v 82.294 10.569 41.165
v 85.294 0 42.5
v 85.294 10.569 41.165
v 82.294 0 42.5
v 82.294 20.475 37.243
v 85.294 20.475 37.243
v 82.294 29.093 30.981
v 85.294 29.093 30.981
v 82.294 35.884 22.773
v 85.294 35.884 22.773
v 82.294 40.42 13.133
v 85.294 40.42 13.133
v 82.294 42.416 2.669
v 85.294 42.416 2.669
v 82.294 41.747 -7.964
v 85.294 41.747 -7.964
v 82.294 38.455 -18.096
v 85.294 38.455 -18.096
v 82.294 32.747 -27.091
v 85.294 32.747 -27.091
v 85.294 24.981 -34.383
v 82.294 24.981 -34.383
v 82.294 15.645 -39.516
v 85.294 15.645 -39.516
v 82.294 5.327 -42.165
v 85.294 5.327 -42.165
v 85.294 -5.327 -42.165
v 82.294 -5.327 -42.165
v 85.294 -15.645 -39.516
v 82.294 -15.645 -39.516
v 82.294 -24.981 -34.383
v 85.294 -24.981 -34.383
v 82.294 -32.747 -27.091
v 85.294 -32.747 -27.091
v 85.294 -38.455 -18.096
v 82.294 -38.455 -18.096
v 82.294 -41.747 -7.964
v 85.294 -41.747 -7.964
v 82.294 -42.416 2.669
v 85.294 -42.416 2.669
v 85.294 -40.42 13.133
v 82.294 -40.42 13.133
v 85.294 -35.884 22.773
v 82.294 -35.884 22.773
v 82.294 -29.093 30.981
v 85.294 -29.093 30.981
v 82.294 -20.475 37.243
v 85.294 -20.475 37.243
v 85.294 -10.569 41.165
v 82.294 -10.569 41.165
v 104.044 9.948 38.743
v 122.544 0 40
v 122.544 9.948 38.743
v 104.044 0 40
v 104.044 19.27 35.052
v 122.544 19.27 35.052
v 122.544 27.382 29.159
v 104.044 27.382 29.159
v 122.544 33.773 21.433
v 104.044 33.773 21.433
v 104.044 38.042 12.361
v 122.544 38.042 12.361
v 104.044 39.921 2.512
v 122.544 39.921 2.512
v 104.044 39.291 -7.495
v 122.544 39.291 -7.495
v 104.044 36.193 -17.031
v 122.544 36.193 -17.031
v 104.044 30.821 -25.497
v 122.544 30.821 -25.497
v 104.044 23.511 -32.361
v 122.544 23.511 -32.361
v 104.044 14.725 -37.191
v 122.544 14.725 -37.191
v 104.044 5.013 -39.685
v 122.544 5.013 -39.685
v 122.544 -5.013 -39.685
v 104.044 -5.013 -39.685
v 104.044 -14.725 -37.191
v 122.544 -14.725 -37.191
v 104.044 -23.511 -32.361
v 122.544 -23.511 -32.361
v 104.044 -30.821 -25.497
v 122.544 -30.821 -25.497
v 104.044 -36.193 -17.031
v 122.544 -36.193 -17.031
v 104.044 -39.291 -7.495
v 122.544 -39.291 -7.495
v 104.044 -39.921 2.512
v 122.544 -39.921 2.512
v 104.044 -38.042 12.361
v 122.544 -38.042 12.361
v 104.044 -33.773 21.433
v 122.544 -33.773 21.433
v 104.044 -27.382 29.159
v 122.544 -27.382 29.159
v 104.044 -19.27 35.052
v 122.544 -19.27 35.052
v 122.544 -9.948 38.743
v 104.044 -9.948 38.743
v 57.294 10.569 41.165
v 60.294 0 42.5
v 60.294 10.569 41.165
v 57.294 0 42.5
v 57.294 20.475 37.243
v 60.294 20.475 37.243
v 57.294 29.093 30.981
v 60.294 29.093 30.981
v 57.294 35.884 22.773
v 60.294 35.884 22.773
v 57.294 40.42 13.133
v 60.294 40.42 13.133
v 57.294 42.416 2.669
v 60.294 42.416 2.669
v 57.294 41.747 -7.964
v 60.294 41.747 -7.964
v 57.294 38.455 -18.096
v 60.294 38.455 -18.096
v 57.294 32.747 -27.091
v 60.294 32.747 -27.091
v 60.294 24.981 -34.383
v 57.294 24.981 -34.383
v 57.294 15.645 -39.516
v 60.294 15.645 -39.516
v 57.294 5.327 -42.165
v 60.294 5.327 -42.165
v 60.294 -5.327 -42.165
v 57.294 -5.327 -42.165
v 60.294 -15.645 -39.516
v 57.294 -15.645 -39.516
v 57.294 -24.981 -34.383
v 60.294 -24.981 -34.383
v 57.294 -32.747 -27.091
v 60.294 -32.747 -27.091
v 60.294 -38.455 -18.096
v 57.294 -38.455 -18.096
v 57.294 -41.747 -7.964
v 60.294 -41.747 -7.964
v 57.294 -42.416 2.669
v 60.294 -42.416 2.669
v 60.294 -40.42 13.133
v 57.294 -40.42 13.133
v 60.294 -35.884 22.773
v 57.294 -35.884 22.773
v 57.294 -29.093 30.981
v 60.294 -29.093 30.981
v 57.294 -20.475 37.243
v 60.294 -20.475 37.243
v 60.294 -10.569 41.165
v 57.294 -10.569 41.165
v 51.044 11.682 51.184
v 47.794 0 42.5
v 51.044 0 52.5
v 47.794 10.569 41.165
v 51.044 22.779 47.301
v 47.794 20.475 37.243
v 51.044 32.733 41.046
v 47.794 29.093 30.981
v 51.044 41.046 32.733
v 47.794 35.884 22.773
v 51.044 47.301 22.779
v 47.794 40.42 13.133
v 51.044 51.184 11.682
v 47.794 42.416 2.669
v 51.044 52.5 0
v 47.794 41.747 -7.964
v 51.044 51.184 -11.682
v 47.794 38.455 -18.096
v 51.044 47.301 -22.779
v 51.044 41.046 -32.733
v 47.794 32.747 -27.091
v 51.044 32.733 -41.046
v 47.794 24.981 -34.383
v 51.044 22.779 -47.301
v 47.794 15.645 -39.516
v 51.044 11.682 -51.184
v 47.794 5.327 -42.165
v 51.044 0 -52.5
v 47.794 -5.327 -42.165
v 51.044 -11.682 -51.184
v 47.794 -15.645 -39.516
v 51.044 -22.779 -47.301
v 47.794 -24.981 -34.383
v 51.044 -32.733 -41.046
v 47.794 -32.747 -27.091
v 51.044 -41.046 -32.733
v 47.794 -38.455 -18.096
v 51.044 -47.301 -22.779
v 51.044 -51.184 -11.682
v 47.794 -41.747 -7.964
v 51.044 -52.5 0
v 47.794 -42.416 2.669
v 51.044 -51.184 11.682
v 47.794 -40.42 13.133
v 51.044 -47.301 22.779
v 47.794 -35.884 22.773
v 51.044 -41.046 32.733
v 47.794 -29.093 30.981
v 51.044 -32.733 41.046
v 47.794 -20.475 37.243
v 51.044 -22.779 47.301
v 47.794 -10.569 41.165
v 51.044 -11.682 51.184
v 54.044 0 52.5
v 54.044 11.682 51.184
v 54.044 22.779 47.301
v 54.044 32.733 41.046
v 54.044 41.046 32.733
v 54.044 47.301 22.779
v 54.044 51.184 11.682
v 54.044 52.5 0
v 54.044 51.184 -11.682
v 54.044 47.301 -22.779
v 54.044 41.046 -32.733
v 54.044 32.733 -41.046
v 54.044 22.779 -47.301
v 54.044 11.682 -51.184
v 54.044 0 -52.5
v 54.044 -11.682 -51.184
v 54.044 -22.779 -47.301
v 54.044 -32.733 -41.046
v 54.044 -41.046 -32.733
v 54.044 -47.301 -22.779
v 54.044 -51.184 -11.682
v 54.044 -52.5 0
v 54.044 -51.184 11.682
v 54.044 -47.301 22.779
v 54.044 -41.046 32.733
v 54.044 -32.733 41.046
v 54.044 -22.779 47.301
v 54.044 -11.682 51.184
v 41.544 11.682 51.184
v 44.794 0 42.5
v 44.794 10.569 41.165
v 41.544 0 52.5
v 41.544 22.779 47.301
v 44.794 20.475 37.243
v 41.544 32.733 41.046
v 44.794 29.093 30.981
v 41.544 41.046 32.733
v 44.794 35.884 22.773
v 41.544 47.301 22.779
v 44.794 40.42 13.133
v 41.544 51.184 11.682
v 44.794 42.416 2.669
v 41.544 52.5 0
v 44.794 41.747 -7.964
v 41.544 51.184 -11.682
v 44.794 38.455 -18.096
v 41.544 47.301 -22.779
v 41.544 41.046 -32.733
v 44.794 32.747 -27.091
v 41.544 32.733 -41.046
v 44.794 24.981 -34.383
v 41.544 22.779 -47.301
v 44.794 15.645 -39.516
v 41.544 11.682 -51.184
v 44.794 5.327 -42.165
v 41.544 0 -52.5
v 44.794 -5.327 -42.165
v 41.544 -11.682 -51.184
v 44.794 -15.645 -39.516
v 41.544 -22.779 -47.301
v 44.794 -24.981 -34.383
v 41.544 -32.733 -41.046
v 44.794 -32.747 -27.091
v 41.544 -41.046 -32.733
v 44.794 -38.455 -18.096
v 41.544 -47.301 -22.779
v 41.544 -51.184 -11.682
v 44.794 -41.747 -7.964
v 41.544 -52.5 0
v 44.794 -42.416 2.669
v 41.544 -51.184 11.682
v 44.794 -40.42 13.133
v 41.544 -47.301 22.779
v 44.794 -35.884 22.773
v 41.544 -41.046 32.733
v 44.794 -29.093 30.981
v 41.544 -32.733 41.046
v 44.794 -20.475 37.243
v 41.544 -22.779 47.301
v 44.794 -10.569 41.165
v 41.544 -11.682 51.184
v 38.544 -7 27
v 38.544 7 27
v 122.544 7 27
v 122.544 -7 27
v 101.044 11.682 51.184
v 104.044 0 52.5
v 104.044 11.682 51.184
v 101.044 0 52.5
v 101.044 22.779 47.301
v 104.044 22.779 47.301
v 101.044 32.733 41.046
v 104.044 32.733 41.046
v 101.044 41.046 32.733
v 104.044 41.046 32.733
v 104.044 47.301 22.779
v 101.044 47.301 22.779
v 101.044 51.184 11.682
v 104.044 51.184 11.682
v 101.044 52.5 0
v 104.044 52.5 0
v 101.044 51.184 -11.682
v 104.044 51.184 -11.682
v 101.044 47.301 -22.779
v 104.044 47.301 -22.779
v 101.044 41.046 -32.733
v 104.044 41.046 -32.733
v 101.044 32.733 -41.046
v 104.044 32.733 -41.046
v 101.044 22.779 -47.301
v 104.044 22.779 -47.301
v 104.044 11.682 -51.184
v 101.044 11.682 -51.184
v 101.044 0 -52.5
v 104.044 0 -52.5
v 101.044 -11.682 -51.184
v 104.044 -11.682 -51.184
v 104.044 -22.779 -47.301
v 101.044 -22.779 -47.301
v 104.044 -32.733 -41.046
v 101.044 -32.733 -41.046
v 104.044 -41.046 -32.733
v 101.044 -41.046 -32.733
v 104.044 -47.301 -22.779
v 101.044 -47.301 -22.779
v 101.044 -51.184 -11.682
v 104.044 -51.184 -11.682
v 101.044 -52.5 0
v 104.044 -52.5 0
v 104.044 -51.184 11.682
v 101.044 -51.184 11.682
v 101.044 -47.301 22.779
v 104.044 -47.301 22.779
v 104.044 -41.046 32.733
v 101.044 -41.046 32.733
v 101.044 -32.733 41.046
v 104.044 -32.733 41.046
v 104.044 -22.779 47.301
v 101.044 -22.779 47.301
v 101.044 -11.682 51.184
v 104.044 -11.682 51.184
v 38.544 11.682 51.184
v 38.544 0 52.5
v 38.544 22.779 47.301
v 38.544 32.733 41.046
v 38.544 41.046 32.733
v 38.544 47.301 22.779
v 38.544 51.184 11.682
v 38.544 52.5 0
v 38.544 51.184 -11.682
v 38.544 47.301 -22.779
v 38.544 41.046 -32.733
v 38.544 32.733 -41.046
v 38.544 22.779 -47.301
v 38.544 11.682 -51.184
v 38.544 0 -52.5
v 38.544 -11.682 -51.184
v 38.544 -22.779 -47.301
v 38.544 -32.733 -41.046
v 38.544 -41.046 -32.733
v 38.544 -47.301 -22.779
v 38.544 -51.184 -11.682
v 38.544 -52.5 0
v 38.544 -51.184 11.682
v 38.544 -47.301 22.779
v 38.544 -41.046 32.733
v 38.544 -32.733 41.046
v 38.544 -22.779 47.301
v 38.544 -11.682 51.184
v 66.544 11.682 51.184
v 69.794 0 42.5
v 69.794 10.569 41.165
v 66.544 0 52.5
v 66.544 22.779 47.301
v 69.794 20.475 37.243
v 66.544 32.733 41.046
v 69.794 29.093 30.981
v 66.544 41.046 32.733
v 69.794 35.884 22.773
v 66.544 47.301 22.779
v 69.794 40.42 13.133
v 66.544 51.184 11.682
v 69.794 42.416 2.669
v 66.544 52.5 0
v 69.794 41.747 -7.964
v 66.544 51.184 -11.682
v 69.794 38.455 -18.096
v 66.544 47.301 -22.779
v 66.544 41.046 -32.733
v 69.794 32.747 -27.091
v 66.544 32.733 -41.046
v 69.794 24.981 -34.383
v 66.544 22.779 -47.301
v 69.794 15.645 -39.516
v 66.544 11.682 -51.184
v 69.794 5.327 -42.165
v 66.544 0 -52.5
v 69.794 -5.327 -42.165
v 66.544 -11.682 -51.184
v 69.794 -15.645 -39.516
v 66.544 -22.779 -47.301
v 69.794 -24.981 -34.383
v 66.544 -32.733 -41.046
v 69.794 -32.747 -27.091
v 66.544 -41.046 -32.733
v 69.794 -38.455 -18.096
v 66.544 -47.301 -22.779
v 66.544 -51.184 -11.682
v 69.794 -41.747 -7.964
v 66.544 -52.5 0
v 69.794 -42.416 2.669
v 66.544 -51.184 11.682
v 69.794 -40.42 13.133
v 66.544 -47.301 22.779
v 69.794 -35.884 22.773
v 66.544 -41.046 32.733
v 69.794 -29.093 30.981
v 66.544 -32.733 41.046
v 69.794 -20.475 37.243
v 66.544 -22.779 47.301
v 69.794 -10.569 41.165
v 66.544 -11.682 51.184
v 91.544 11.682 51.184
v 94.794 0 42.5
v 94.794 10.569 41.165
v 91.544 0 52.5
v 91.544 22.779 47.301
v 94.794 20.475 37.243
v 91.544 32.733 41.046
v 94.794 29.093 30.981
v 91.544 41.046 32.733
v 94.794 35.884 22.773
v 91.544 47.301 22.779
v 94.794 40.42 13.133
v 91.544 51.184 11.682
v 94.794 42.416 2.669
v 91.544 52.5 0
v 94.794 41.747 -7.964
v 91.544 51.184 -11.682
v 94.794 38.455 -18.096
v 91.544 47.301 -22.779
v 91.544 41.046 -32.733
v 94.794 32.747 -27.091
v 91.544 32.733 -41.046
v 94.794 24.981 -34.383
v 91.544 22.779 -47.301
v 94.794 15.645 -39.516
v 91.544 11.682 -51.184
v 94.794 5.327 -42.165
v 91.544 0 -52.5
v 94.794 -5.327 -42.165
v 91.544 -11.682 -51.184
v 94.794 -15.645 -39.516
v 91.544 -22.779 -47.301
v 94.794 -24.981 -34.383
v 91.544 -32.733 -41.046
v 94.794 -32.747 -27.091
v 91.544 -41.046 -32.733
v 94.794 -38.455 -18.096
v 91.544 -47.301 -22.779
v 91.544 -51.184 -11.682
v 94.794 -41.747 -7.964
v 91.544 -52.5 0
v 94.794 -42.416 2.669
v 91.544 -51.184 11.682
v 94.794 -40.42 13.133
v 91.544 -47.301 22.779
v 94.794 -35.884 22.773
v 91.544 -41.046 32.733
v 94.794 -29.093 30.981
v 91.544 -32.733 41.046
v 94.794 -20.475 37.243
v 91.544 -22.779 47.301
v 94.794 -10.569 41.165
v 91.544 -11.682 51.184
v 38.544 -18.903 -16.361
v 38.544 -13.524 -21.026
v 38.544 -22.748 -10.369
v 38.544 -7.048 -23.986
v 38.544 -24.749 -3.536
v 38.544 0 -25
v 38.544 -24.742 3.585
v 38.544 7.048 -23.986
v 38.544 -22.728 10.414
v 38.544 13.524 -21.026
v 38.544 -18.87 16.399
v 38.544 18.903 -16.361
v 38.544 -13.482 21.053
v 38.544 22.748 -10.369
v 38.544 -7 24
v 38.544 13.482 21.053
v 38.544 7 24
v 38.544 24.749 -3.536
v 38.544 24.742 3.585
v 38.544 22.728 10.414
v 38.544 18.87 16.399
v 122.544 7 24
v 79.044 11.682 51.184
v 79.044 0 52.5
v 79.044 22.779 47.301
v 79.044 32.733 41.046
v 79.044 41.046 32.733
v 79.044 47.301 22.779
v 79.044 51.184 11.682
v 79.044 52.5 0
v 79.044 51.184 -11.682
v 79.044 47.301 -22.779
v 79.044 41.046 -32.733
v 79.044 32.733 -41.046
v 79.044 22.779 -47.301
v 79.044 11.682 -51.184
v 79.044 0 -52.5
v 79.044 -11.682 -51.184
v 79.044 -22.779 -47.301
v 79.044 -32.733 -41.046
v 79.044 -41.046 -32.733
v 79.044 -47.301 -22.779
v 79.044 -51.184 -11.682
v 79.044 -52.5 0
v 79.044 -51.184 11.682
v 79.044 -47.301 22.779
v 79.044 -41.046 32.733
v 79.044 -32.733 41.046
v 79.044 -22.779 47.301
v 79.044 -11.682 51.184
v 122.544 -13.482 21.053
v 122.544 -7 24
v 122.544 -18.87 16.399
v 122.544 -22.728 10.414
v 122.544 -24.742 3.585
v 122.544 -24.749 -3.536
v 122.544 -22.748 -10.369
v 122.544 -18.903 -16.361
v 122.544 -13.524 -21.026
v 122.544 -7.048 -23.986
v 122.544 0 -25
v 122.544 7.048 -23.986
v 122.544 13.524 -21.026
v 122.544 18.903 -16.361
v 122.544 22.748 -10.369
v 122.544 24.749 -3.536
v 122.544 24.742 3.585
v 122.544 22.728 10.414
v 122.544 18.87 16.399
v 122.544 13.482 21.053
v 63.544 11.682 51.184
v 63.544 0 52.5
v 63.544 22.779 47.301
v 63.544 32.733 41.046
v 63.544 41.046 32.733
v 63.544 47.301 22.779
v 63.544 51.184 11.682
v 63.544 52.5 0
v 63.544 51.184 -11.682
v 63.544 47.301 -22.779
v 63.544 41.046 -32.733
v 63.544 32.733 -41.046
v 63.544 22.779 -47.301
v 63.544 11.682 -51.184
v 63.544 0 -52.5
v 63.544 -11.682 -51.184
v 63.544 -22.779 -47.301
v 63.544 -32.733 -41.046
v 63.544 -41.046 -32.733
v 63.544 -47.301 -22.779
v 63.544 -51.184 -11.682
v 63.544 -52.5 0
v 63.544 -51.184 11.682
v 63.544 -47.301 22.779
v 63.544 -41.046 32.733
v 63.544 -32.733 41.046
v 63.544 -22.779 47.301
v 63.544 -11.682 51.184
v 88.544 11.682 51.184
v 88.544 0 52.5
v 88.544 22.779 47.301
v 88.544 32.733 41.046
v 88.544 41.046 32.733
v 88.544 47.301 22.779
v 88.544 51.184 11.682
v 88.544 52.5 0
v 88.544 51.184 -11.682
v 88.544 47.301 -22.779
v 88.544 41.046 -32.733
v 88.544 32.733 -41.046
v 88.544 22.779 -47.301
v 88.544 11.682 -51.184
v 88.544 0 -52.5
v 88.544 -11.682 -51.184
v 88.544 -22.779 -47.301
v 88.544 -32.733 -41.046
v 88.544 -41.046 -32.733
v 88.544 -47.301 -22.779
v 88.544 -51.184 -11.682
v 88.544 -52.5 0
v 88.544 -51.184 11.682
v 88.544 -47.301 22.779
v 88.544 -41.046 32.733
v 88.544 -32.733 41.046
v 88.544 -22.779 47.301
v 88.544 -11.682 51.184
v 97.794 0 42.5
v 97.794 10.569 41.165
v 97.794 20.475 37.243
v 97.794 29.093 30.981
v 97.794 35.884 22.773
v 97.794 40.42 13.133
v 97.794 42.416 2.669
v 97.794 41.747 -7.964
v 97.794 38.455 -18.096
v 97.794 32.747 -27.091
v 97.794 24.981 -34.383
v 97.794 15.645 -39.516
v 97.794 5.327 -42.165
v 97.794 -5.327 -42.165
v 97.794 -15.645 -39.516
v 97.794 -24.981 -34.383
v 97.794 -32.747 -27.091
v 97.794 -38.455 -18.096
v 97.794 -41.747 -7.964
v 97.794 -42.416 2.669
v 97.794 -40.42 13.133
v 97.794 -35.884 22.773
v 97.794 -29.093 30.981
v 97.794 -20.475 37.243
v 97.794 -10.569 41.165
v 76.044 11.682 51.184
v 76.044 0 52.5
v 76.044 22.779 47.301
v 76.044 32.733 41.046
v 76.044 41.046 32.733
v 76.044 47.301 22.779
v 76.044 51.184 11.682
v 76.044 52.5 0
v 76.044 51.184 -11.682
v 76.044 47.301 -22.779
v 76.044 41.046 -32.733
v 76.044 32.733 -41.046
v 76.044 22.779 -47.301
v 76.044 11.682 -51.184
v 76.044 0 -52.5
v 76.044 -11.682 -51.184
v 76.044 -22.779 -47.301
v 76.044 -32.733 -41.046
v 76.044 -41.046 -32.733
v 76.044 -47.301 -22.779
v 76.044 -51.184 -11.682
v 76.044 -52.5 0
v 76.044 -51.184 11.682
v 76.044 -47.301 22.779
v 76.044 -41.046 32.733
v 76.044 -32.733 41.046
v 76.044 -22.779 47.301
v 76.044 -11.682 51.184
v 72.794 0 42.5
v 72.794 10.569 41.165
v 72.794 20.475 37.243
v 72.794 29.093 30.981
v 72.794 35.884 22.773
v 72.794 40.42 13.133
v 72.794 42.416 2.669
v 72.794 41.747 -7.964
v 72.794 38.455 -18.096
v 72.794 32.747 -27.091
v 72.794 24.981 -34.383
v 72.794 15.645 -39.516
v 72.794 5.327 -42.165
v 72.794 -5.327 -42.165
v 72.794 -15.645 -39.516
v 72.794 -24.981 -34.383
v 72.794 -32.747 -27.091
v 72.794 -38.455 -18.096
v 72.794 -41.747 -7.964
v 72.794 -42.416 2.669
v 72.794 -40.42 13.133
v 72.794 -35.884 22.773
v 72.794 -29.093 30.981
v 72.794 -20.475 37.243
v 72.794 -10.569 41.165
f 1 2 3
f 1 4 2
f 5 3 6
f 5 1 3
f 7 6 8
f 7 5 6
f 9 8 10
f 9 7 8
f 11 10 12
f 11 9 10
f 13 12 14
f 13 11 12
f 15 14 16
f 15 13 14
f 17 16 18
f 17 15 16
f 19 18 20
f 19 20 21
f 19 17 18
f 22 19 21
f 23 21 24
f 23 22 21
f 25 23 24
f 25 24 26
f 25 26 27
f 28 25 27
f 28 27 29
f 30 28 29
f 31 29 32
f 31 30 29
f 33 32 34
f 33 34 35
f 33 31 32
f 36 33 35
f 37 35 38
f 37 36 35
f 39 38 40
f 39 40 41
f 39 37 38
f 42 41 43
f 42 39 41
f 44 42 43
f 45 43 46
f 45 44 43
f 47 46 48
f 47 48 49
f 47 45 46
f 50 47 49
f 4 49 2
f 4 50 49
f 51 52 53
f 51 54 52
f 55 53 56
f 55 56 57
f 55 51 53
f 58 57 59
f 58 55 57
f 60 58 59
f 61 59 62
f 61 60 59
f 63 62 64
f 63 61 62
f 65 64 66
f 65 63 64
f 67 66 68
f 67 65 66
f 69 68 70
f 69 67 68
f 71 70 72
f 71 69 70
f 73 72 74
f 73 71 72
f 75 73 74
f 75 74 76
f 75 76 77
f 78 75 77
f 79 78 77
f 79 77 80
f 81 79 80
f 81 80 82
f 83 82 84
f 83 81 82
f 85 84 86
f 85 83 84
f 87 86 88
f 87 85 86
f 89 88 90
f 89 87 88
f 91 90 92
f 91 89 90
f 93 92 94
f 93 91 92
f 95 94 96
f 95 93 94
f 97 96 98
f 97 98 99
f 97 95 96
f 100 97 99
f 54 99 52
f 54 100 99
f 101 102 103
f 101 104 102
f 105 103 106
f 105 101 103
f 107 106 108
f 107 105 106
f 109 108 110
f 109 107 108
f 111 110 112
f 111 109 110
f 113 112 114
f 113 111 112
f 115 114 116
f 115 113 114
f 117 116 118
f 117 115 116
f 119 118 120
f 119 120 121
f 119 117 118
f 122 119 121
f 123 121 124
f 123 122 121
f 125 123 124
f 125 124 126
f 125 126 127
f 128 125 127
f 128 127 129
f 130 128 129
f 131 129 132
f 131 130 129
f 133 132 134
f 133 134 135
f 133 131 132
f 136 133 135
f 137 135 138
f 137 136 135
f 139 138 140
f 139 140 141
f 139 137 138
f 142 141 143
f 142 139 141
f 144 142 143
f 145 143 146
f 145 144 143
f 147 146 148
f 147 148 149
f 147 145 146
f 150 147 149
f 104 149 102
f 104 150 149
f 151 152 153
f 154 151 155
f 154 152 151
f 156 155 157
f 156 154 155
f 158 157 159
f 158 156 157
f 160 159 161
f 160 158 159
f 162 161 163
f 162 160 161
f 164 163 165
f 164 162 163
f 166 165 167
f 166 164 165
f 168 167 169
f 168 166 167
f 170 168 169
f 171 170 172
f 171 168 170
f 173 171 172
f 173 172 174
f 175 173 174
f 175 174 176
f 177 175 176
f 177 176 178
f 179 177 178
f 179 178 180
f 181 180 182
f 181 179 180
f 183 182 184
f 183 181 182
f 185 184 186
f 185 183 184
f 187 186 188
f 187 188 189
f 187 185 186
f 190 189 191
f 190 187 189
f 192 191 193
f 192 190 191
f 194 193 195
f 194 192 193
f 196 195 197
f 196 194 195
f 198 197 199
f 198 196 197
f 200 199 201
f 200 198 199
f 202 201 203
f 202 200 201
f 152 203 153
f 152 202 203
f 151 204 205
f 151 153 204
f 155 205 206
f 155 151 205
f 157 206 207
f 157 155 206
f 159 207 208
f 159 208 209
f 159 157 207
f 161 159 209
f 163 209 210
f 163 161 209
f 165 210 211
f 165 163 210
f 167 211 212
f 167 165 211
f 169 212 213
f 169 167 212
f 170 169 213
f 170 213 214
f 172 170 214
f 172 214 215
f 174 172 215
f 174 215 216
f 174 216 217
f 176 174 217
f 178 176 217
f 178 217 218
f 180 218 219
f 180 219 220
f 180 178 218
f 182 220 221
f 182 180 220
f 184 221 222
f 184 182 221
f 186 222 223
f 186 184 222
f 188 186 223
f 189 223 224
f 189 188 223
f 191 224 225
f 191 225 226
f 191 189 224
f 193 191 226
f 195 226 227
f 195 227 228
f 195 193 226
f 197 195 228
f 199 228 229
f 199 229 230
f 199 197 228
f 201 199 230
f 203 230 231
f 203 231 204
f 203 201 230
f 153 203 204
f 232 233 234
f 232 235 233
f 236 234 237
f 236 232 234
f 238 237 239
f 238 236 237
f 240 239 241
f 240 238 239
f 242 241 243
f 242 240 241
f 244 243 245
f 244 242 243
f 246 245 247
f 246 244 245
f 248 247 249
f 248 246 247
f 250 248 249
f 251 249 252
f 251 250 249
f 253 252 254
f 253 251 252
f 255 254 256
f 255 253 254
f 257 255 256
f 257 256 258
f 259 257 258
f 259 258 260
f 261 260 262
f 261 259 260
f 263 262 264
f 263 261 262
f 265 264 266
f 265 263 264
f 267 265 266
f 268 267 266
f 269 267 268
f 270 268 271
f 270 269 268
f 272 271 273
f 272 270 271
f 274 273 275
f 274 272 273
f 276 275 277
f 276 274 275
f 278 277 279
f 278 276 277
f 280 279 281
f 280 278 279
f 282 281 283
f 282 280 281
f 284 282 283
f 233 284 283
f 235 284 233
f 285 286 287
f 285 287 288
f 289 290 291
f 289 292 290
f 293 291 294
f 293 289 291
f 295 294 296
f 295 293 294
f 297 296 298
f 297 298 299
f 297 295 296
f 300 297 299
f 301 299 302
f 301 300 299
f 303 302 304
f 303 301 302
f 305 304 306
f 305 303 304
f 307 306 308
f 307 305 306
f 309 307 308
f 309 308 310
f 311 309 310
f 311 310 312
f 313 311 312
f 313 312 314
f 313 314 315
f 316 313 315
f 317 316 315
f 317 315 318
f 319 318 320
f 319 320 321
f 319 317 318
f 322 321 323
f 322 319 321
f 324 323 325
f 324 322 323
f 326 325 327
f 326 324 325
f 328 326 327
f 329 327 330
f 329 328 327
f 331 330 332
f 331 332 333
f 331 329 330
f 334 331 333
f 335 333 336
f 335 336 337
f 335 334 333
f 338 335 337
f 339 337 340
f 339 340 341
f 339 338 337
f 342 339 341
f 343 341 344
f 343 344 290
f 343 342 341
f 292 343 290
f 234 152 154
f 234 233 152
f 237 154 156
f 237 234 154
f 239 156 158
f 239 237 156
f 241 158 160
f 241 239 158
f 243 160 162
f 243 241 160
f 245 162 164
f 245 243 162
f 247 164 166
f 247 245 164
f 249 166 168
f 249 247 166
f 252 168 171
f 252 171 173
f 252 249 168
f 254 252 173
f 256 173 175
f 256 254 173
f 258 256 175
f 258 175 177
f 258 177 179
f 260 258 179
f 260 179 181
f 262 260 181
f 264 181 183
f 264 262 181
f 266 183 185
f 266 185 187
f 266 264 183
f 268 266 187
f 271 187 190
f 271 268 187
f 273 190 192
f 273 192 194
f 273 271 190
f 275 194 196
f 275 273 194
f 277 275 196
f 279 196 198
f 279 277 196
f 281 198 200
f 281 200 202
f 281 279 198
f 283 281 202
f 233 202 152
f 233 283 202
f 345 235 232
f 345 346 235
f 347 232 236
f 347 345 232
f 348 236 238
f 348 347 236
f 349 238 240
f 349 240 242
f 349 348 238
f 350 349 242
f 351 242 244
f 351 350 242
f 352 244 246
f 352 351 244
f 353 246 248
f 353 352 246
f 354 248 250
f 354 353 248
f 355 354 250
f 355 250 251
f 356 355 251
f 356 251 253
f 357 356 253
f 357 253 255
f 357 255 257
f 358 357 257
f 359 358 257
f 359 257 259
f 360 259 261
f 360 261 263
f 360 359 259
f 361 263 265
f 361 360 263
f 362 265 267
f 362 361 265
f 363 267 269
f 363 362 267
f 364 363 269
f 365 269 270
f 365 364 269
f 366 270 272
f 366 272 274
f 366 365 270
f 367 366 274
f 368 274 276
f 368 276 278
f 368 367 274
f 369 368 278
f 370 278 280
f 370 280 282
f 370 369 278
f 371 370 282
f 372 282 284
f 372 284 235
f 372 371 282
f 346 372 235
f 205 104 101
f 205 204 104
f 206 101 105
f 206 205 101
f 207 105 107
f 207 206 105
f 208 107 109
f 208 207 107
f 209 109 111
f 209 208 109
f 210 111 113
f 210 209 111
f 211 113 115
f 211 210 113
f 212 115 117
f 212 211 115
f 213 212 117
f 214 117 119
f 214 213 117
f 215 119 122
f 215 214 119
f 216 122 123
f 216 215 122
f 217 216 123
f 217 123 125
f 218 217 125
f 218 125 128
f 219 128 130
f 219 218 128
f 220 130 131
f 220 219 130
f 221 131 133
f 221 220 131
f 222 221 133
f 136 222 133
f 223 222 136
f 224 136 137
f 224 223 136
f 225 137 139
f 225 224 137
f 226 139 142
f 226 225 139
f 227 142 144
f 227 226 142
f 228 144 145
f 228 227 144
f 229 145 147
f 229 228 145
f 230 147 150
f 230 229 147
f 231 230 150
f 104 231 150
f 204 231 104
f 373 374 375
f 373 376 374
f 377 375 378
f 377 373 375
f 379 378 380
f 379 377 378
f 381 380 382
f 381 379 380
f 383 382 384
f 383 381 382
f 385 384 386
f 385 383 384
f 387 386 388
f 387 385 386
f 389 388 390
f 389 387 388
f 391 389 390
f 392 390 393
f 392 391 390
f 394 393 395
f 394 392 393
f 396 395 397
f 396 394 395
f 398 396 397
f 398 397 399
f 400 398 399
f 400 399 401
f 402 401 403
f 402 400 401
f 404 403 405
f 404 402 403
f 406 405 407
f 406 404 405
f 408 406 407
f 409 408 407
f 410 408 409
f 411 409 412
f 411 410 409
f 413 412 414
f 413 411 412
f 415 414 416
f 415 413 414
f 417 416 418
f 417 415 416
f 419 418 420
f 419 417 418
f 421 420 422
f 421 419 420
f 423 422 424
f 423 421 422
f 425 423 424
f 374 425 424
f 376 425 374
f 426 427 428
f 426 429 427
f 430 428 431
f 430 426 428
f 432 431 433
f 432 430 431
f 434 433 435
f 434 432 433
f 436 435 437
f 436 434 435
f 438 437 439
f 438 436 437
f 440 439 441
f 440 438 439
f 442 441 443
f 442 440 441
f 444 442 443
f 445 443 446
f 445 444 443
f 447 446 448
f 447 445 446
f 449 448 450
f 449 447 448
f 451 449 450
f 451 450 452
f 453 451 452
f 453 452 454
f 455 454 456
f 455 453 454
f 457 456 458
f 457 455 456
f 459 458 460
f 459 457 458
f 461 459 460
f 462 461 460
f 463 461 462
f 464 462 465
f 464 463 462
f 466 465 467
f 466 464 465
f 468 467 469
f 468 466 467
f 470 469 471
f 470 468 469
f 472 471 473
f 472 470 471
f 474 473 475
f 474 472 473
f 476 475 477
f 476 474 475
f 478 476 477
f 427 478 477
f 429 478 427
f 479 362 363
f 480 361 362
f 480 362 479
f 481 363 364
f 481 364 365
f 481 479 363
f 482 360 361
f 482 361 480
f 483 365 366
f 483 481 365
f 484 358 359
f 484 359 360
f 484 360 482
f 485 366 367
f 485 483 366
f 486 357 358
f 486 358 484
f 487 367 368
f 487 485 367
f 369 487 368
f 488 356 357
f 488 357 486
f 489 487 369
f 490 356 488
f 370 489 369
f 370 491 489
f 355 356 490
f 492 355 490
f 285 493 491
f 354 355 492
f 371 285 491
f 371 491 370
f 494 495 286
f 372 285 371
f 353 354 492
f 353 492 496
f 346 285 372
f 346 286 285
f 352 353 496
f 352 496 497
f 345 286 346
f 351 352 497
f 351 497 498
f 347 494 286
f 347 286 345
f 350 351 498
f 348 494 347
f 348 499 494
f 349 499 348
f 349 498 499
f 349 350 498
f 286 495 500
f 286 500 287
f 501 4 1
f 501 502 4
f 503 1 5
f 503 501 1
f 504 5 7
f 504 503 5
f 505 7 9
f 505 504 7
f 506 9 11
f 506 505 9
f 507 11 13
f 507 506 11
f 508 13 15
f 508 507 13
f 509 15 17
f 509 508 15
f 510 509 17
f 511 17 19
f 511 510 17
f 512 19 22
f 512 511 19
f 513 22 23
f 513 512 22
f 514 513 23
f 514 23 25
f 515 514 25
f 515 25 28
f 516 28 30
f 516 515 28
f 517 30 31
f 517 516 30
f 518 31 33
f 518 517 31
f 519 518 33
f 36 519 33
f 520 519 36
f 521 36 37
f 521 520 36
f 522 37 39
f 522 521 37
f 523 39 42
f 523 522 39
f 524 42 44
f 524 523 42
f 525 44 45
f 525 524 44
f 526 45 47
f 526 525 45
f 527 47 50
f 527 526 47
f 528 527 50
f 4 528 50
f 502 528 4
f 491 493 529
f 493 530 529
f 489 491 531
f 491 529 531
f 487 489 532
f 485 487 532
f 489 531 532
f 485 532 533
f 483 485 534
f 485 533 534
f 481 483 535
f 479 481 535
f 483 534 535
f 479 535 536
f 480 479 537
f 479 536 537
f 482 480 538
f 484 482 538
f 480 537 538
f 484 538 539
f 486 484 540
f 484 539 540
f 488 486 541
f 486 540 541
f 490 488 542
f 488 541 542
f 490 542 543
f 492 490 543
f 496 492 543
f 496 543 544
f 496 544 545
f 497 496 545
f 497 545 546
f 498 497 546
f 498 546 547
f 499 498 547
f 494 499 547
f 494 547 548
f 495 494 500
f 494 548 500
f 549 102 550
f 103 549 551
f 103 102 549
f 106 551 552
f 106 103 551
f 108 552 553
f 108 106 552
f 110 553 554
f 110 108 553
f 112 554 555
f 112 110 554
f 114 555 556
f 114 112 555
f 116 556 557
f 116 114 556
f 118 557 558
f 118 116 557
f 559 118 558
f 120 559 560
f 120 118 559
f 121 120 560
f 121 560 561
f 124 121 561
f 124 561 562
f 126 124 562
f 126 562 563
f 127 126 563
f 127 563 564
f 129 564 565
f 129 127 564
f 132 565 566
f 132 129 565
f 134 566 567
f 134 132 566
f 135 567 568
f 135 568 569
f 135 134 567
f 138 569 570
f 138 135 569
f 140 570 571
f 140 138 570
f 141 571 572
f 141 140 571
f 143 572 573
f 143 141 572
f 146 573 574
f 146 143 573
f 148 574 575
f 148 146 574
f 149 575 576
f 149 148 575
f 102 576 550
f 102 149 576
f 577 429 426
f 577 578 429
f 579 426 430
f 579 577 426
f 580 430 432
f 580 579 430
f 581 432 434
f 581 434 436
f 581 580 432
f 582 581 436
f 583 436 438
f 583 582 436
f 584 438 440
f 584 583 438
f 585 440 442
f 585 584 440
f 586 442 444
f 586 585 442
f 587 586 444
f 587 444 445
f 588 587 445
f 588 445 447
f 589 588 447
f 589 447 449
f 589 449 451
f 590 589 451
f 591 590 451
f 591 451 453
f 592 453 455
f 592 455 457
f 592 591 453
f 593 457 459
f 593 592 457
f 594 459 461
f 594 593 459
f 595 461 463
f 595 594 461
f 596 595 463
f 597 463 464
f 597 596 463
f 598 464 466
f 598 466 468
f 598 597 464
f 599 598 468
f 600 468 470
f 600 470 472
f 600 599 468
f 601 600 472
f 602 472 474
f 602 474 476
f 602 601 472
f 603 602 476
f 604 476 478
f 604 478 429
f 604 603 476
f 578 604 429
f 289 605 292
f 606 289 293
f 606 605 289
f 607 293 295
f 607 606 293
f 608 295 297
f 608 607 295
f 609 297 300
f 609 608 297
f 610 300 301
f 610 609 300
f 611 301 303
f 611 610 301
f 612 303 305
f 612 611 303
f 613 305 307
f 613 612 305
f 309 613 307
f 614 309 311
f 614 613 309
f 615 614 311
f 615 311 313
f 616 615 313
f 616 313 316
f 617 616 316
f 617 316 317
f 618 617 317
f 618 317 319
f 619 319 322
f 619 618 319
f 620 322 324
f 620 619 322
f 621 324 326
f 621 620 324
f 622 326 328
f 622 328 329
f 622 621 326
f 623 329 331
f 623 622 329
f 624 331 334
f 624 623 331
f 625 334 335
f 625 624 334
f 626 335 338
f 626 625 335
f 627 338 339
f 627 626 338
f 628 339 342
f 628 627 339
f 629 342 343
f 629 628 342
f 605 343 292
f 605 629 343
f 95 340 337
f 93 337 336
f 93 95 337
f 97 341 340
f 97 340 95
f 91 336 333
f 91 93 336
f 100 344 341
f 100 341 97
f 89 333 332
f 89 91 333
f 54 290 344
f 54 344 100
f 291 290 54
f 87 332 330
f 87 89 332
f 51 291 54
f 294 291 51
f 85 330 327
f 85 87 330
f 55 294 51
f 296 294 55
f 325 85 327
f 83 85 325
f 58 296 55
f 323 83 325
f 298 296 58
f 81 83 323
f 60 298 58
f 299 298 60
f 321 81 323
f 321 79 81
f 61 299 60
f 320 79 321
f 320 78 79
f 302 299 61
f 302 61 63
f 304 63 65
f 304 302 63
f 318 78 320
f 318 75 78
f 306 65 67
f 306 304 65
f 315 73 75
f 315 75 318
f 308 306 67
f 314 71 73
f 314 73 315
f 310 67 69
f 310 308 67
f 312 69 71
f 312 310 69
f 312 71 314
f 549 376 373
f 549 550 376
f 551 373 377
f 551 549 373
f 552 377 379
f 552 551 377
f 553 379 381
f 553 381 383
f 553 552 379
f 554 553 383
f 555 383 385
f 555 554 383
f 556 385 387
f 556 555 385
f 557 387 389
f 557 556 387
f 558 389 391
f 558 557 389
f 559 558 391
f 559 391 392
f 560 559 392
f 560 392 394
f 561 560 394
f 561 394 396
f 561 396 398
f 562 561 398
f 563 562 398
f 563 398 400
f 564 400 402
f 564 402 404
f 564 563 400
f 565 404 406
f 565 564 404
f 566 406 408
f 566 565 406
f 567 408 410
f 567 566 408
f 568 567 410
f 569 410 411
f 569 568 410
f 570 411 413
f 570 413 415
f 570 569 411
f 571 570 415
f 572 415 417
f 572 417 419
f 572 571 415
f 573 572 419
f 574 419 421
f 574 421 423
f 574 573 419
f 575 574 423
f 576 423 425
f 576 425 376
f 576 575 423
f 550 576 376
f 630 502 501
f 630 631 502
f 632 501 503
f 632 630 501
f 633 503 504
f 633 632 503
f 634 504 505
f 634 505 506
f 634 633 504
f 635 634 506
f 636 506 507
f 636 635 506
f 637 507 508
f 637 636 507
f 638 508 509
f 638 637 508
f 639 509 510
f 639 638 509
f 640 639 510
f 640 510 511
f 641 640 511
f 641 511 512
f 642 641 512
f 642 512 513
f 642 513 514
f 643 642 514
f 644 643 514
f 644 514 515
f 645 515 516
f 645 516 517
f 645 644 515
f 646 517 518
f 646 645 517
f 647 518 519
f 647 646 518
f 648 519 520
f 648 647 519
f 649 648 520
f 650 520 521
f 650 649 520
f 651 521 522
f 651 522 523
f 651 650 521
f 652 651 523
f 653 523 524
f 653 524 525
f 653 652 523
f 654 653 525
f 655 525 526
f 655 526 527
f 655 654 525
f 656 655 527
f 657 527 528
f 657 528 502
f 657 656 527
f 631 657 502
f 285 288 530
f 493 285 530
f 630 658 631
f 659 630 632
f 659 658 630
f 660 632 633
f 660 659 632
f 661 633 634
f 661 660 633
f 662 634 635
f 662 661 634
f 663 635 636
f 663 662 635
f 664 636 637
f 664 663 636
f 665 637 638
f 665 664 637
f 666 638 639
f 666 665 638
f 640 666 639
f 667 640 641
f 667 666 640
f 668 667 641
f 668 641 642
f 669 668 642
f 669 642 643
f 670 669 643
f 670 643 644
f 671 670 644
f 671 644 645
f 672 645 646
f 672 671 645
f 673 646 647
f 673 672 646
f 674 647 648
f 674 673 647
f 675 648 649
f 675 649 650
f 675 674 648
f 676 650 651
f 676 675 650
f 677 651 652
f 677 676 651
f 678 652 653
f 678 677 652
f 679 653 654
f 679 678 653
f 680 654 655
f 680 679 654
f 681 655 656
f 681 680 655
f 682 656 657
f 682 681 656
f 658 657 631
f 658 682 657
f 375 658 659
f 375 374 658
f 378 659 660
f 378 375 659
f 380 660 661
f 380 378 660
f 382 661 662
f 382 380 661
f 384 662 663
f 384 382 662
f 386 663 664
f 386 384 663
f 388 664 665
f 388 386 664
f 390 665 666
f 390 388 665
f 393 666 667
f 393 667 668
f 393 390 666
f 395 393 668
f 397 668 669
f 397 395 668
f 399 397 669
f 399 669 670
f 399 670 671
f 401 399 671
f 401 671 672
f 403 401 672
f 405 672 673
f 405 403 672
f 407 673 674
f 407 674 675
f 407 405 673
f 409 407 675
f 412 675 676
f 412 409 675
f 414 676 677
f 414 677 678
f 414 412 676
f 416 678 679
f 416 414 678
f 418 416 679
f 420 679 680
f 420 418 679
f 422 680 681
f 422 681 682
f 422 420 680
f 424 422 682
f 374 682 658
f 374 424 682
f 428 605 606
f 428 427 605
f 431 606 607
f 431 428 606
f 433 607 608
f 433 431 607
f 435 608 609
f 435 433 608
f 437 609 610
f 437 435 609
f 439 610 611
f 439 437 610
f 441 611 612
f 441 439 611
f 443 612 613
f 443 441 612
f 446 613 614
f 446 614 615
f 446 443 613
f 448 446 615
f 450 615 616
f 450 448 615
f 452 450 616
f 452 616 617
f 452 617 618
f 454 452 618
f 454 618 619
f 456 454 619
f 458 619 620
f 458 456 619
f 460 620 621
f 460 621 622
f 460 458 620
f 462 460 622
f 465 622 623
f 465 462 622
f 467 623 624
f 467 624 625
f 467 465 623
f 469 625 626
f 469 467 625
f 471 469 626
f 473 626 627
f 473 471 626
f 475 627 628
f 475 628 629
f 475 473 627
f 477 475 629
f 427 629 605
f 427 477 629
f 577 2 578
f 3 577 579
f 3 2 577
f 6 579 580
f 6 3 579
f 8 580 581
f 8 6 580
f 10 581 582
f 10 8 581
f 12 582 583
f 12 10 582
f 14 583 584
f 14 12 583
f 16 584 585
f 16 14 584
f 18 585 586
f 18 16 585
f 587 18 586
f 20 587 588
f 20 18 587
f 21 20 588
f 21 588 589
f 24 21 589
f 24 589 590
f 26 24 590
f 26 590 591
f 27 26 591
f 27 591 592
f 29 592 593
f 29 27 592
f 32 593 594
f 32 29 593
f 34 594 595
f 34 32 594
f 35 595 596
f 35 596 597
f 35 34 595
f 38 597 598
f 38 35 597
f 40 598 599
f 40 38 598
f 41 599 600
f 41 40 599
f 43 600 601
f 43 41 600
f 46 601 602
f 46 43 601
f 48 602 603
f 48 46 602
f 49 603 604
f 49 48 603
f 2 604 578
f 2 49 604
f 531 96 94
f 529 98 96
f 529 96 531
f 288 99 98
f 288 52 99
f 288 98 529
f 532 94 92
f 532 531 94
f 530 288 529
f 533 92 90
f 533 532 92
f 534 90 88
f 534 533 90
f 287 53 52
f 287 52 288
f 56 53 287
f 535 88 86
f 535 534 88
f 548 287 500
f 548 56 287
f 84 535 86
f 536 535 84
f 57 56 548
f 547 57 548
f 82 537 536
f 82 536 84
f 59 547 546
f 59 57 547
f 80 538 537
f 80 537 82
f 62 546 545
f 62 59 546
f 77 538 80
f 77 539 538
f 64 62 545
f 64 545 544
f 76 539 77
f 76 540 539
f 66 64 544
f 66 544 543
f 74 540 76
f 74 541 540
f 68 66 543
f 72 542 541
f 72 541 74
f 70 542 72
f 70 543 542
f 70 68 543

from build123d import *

# Parameters (mm, degrees)
F2_R     = 25
F3_DEPTH = 84
F5_DEPTH = 84


with BuildPart() as f1:
    # F0 (on Front) → F1 (revolve)
    with BuildSketch(Plane.XZ):
        Polygon((38.5438650846, 52.5), (38.5438650846, 0), (122.5438650846, 0), (122.5438650846, 40), (104.0438650846, 40), (104.0438650846, 52.5), (101.0438650846, 52.5), (97.7938650846, 42.5), (94.7938650846, 42.5), (91.5438650846, 52.5), (88.5438650846, 52.5), (85.2938650846, 42.5), (82.2938650846, 42.5), (79.0438650846, 52.5), (76.0438650846, 52.5), (72.7938650846, 42.5), (69.7938650846, 42.5), (66.5438650846, 52.5), (63.5438650846, 52.5), (60.2938650846, 42.5), (57.2938650846, 42.5), (54.0438650846, 52.5), (51.0438650846, 52.5), (47.7938650846, 42.5), (44.7938650846, 42.5), (41.5438650846, 52.5), align=None)
    revolve(axis=Axis((80.5438650846, 0, 0), (-1, 0, 0)))

    # F2 (on face) → F3 (cut)
    with BuildSketch(Plane.YZ.offset(122.5438650846)):
        Circle(F2_R)
    extrude(amount=-F3_DEPTH, mode=Mode.SUBTRACT)

    # F4 (on face) → F5 (cut)
    with BuildSketch(Plane.YZ.offset(122.5438650846)):
        with BuildLine():
            Line((-7, 27), (-7, 24))
            ThreePointArc((-7, 24), (0, 25), (7, 24))
            Line((7, 24), (7, 27))
            Line((7, 27), (-7, 27))
        make_face()
    extrude(amount=-F5_DEPTH, mode=Mode.SUBTRACT)


solid = f1.part
